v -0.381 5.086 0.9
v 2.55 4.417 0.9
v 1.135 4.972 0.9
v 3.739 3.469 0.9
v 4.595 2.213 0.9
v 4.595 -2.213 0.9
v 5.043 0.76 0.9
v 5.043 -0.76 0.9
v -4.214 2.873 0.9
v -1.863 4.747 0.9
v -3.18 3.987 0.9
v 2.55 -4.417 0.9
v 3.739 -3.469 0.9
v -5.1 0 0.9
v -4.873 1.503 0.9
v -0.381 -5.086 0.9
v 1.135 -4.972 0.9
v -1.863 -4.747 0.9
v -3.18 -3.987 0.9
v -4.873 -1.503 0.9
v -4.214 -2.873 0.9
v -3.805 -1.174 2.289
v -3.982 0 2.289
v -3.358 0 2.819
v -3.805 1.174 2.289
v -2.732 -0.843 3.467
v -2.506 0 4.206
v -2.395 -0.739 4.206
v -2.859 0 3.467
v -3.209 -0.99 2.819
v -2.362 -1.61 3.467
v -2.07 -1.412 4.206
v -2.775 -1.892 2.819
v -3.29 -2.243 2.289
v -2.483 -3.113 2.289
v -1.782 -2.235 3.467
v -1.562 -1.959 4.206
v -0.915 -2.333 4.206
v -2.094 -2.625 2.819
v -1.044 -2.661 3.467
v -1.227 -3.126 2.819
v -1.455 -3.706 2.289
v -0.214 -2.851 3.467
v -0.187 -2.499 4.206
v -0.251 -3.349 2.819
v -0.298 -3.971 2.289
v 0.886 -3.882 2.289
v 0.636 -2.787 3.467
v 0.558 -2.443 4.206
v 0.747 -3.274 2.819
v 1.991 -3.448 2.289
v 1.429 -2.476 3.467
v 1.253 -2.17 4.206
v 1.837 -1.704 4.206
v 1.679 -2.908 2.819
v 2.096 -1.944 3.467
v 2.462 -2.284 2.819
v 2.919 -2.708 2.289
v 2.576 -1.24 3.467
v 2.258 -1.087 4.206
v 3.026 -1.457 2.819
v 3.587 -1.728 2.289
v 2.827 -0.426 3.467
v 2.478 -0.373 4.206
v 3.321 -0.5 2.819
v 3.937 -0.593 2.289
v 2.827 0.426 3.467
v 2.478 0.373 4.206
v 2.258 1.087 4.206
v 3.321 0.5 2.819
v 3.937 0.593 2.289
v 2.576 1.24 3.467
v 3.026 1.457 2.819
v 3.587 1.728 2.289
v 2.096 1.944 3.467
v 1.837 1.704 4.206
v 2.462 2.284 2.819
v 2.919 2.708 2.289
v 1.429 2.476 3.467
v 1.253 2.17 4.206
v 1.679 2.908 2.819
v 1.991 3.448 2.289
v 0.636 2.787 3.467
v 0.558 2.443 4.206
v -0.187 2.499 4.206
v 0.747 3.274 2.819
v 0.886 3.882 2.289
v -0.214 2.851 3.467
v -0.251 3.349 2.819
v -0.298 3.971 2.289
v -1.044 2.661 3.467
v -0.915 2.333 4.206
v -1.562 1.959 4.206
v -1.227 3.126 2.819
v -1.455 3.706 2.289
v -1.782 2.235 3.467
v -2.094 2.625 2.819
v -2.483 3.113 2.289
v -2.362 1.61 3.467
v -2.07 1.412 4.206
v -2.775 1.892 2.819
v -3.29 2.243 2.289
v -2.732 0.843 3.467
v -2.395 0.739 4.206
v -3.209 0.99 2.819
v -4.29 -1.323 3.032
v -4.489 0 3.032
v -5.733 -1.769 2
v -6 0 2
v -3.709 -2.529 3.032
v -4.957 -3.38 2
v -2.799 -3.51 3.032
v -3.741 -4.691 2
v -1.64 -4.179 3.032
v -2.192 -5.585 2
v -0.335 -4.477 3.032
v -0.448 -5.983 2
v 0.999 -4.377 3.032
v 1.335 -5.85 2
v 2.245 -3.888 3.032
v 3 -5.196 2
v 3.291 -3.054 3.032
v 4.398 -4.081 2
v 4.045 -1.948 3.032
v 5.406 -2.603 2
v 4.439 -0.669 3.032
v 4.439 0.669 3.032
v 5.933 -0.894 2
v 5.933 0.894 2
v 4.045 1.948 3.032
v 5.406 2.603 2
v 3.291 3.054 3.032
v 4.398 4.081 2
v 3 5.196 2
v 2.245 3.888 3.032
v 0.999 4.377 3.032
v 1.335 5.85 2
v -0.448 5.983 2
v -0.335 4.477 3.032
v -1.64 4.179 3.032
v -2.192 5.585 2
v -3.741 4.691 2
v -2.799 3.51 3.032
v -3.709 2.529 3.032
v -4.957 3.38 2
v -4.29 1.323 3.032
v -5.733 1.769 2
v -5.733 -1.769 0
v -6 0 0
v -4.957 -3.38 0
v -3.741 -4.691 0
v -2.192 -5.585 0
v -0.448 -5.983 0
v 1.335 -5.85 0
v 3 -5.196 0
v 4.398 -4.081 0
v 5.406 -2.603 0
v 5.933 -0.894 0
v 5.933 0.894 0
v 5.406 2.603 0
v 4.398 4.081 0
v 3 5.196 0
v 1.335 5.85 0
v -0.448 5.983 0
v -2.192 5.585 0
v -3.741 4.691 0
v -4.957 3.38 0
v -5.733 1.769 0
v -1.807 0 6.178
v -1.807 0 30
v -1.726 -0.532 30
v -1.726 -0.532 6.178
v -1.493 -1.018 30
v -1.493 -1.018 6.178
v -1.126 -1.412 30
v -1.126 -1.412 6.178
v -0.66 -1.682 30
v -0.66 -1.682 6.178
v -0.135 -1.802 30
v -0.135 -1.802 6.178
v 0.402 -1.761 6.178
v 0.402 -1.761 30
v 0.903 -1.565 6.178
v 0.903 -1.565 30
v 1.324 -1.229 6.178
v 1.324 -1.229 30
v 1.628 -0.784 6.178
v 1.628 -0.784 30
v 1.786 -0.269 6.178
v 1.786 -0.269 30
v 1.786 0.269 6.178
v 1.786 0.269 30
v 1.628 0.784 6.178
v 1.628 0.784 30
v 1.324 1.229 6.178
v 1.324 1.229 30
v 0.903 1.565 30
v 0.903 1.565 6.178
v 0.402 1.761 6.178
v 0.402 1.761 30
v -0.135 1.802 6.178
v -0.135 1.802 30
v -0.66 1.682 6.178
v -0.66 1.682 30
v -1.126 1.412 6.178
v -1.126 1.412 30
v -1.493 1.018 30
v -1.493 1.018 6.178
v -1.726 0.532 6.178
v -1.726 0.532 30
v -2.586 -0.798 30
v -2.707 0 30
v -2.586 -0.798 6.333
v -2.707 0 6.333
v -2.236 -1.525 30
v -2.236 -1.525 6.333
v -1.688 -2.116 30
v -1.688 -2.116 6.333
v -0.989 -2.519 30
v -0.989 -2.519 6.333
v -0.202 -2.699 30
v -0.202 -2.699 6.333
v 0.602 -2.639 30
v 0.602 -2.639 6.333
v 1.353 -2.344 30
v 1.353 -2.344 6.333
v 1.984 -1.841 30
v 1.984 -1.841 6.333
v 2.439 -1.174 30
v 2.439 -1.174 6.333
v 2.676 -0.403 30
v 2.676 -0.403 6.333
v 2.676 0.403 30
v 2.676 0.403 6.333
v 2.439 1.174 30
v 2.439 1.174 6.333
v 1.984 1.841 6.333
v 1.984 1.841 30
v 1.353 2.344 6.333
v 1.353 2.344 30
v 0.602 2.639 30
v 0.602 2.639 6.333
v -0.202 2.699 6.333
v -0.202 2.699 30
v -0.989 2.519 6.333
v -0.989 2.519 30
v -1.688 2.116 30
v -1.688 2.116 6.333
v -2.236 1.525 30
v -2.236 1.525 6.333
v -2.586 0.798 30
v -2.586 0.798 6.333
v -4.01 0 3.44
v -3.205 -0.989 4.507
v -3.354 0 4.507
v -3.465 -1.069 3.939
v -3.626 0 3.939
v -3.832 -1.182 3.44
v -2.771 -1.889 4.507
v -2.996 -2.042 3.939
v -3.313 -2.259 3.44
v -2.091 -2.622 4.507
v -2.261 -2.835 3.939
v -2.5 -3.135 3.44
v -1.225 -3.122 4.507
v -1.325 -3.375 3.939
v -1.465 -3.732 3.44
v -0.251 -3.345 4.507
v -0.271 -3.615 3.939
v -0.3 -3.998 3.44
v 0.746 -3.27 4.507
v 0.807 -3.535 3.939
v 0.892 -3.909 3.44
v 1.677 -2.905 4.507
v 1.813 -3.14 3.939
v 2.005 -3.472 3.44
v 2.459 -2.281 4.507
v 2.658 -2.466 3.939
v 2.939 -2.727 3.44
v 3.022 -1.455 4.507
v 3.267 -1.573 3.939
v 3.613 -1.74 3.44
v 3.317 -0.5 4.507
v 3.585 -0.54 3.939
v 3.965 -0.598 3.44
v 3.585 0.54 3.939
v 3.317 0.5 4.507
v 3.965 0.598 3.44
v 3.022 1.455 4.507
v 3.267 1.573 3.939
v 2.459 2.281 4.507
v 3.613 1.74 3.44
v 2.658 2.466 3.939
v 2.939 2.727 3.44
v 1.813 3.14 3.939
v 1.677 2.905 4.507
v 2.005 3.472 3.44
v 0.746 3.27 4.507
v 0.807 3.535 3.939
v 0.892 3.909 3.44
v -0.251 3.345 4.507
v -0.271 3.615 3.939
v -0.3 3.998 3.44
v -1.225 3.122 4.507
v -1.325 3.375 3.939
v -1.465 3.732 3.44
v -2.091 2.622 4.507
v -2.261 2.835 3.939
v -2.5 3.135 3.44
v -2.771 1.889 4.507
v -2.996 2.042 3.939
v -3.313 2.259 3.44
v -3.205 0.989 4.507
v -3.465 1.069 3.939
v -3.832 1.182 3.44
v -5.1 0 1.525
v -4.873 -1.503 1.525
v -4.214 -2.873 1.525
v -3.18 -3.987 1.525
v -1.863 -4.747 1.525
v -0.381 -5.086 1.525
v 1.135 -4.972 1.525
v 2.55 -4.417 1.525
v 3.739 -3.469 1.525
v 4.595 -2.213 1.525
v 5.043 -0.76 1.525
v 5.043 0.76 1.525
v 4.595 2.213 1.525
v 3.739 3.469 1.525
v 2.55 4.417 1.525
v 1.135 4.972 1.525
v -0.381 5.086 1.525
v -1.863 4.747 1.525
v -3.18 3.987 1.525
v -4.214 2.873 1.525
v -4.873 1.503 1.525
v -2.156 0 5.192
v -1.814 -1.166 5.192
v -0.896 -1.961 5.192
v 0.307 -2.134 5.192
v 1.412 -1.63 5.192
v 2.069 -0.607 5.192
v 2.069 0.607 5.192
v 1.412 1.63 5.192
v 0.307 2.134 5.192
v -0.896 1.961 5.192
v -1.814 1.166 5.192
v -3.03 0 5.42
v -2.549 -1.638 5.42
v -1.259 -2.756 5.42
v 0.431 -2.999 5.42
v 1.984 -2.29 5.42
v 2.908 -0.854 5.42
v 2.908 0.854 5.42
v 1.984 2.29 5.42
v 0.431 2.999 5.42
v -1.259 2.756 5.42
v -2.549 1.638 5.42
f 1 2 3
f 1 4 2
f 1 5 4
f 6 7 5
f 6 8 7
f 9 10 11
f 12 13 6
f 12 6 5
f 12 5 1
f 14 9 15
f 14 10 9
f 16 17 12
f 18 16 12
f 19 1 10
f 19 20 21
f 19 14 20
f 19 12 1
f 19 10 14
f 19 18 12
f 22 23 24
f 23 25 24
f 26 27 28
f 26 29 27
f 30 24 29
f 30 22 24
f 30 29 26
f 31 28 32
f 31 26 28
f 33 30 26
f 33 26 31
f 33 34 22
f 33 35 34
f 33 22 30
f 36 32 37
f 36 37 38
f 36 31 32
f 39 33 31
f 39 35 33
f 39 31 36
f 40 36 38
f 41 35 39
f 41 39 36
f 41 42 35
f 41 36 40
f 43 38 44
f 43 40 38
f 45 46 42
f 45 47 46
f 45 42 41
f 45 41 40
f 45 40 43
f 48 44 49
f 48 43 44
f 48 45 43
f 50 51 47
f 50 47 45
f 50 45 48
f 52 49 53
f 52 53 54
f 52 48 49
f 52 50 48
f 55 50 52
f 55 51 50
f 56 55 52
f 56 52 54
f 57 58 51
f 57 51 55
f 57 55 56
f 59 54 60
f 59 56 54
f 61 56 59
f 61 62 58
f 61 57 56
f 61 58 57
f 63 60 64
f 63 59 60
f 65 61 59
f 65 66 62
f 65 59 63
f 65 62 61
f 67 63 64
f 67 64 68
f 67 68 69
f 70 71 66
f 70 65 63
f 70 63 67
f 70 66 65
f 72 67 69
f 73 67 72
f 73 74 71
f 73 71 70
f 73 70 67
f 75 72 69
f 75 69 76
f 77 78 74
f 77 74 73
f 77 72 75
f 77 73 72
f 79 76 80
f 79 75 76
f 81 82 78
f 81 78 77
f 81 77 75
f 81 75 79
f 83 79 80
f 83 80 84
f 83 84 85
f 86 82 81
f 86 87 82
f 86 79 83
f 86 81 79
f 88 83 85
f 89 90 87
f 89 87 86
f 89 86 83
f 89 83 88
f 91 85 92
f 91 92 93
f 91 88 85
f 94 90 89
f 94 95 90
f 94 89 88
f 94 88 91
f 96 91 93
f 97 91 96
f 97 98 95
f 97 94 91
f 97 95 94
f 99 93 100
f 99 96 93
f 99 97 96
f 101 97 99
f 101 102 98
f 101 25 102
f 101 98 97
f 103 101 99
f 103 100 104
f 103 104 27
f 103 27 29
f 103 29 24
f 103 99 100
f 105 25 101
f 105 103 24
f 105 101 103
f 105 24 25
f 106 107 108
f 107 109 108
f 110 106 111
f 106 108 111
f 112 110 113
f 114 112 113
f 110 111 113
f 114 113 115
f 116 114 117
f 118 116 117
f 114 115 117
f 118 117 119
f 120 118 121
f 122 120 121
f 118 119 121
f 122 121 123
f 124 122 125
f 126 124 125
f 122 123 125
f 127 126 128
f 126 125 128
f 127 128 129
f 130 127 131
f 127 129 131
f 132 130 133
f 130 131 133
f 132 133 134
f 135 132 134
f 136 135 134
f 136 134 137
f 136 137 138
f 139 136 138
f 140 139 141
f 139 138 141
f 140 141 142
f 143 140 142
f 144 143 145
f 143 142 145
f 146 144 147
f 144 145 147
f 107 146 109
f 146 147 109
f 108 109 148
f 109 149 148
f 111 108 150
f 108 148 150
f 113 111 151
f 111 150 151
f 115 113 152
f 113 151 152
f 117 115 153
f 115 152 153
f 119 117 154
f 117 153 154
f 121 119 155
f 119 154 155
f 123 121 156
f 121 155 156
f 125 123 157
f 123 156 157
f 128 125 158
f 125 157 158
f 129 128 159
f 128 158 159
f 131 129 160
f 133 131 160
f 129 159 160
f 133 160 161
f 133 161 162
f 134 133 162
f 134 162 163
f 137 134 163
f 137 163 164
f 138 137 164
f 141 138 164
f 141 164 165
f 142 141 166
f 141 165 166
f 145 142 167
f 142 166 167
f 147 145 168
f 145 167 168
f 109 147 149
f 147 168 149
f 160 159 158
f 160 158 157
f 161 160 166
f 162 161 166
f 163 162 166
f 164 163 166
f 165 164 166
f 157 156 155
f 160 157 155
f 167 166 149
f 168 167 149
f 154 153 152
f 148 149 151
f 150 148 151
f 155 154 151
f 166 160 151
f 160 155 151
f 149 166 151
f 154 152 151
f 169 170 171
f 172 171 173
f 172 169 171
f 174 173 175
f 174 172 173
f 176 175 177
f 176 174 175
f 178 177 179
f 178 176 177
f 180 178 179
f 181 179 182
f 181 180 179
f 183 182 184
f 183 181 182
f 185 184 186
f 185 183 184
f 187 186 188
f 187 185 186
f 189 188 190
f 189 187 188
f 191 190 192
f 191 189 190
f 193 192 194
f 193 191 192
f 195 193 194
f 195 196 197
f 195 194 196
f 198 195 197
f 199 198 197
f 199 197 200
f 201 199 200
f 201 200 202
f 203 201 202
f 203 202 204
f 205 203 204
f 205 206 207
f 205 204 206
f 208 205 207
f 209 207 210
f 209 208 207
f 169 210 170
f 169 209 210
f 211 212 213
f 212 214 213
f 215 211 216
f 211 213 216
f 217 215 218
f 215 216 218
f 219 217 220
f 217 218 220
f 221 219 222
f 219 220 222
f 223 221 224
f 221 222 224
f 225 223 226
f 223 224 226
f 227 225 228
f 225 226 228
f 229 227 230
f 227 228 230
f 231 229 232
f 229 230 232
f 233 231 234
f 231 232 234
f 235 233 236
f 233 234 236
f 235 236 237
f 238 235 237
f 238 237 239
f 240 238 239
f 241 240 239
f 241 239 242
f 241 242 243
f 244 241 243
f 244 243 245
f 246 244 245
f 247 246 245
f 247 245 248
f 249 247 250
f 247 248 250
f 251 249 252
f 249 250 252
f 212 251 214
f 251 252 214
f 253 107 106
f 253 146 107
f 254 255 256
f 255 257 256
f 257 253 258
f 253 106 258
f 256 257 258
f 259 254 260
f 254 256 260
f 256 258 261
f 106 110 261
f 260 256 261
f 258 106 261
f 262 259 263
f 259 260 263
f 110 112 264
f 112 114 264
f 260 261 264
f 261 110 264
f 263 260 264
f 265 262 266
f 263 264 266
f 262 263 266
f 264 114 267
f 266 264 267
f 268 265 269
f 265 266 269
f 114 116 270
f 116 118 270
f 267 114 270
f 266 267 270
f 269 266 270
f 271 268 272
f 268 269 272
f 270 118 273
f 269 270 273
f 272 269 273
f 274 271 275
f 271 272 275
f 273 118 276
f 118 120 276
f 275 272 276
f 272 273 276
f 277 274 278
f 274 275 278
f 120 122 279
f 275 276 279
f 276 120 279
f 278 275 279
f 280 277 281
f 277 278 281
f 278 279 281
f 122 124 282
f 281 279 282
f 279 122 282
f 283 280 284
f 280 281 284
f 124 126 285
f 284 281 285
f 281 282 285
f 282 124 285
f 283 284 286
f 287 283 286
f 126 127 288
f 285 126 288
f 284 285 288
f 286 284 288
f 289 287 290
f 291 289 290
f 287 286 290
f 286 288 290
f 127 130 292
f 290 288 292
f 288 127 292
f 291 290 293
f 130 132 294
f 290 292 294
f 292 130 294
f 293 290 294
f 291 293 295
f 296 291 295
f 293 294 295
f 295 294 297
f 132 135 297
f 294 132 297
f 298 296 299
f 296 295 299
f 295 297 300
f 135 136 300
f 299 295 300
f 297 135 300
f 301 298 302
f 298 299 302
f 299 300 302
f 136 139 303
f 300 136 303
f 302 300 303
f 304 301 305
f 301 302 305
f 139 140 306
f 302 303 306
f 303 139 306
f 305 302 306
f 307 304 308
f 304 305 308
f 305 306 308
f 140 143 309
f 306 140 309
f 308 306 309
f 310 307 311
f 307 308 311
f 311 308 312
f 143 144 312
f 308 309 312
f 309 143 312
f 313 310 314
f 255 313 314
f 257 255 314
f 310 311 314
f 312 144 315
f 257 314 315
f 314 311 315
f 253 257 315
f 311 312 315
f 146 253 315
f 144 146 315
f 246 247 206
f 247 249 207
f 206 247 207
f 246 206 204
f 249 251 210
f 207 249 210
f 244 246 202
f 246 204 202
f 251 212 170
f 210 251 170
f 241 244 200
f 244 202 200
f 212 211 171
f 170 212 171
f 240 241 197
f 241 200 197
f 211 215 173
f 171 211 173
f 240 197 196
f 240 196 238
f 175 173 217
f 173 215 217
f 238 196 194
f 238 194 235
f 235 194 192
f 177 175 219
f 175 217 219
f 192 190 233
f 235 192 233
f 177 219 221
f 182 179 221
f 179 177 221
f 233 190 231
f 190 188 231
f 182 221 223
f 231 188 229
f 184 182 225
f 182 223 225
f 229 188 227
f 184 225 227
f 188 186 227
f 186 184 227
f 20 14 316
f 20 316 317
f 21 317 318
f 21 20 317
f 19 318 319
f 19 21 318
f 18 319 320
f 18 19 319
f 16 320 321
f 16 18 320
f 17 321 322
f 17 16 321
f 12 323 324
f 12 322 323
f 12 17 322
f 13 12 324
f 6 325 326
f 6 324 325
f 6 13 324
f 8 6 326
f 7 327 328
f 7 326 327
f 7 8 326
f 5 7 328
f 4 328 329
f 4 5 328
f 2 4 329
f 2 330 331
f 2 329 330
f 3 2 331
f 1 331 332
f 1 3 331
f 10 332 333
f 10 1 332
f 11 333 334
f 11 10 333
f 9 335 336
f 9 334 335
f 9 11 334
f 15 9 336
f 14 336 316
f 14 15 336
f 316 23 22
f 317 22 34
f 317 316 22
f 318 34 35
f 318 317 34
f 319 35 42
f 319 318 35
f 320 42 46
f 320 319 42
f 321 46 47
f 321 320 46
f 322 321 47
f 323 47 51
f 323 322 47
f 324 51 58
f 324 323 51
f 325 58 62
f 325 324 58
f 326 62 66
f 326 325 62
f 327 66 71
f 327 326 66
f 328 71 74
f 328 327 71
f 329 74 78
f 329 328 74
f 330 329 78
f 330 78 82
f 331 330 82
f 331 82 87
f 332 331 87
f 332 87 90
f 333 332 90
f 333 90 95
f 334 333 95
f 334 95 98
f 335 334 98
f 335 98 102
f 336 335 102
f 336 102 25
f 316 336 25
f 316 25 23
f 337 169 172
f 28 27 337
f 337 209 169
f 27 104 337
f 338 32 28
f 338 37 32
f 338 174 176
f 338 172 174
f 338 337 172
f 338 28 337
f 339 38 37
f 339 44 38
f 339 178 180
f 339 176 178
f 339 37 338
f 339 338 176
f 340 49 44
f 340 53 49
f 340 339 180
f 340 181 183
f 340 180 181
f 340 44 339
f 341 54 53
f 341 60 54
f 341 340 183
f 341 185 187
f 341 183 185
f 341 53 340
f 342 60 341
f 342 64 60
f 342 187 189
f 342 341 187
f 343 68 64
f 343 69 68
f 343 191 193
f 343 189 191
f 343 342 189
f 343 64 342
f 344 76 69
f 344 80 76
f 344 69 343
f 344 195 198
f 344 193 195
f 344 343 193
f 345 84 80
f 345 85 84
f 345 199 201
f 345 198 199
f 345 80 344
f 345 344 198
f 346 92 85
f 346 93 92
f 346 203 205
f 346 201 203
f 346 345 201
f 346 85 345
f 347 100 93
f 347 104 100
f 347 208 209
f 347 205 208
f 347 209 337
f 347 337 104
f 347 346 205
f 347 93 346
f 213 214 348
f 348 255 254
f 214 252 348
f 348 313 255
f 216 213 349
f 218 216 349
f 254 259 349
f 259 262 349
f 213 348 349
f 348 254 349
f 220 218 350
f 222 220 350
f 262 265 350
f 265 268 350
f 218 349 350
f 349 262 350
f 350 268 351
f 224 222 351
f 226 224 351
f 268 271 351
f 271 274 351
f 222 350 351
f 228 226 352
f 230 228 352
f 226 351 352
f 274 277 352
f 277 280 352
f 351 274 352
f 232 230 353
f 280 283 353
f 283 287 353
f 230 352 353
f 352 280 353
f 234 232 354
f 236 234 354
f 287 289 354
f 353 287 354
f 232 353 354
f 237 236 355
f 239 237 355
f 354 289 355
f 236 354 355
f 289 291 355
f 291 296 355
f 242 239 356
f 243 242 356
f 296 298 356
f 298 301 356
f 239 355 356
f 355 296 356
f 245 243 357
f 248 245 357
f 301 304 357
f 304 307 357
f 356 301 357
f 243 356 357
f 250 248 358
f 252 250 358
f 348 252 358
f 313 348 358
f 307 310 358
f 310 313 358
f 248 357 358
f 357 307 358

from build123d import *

# Parameters (mm, degrees)
F2_T = -0.9


with BuildPart() as f1:
    # F0 (on Front) → F1 (revolve)
    with BuildSketch(Plane.XZ):
        with BuildLine():
            Line((-6, 0), (0, 0))
            Line((0, 0), (0, 30))
            Line((0, 30), (-2.7065660749, 30))
            Line((-2.7065660749, 30), (-2.7065660749, 6.3329207692))
            Line((-2.7065660749, 6.3329207692), (-3.3541182942, 4.5065977652))
            ThreePointArc((-3.3541182942, 4.5065977652), (-3.804509639, 3.6790523714), (-4.4893614126, 3.0320115764))
            Line((-4.4893614126, 3.0320115764), (-6, 2))
            Line((-6, 2), (-6, 0))
        make_face()
    revolve(axis=Axis((0, 0, 15), (0, 0, 1)))

    # F2
    f2_openings = [f1.faces().sort_by_distance(p)[0] for p in [
        (0, 0, 30),
    ]]
    offset(amount=F2_T, openings=f2_openings, kind=Kind.INTERSECTION)


solid = f1.part
